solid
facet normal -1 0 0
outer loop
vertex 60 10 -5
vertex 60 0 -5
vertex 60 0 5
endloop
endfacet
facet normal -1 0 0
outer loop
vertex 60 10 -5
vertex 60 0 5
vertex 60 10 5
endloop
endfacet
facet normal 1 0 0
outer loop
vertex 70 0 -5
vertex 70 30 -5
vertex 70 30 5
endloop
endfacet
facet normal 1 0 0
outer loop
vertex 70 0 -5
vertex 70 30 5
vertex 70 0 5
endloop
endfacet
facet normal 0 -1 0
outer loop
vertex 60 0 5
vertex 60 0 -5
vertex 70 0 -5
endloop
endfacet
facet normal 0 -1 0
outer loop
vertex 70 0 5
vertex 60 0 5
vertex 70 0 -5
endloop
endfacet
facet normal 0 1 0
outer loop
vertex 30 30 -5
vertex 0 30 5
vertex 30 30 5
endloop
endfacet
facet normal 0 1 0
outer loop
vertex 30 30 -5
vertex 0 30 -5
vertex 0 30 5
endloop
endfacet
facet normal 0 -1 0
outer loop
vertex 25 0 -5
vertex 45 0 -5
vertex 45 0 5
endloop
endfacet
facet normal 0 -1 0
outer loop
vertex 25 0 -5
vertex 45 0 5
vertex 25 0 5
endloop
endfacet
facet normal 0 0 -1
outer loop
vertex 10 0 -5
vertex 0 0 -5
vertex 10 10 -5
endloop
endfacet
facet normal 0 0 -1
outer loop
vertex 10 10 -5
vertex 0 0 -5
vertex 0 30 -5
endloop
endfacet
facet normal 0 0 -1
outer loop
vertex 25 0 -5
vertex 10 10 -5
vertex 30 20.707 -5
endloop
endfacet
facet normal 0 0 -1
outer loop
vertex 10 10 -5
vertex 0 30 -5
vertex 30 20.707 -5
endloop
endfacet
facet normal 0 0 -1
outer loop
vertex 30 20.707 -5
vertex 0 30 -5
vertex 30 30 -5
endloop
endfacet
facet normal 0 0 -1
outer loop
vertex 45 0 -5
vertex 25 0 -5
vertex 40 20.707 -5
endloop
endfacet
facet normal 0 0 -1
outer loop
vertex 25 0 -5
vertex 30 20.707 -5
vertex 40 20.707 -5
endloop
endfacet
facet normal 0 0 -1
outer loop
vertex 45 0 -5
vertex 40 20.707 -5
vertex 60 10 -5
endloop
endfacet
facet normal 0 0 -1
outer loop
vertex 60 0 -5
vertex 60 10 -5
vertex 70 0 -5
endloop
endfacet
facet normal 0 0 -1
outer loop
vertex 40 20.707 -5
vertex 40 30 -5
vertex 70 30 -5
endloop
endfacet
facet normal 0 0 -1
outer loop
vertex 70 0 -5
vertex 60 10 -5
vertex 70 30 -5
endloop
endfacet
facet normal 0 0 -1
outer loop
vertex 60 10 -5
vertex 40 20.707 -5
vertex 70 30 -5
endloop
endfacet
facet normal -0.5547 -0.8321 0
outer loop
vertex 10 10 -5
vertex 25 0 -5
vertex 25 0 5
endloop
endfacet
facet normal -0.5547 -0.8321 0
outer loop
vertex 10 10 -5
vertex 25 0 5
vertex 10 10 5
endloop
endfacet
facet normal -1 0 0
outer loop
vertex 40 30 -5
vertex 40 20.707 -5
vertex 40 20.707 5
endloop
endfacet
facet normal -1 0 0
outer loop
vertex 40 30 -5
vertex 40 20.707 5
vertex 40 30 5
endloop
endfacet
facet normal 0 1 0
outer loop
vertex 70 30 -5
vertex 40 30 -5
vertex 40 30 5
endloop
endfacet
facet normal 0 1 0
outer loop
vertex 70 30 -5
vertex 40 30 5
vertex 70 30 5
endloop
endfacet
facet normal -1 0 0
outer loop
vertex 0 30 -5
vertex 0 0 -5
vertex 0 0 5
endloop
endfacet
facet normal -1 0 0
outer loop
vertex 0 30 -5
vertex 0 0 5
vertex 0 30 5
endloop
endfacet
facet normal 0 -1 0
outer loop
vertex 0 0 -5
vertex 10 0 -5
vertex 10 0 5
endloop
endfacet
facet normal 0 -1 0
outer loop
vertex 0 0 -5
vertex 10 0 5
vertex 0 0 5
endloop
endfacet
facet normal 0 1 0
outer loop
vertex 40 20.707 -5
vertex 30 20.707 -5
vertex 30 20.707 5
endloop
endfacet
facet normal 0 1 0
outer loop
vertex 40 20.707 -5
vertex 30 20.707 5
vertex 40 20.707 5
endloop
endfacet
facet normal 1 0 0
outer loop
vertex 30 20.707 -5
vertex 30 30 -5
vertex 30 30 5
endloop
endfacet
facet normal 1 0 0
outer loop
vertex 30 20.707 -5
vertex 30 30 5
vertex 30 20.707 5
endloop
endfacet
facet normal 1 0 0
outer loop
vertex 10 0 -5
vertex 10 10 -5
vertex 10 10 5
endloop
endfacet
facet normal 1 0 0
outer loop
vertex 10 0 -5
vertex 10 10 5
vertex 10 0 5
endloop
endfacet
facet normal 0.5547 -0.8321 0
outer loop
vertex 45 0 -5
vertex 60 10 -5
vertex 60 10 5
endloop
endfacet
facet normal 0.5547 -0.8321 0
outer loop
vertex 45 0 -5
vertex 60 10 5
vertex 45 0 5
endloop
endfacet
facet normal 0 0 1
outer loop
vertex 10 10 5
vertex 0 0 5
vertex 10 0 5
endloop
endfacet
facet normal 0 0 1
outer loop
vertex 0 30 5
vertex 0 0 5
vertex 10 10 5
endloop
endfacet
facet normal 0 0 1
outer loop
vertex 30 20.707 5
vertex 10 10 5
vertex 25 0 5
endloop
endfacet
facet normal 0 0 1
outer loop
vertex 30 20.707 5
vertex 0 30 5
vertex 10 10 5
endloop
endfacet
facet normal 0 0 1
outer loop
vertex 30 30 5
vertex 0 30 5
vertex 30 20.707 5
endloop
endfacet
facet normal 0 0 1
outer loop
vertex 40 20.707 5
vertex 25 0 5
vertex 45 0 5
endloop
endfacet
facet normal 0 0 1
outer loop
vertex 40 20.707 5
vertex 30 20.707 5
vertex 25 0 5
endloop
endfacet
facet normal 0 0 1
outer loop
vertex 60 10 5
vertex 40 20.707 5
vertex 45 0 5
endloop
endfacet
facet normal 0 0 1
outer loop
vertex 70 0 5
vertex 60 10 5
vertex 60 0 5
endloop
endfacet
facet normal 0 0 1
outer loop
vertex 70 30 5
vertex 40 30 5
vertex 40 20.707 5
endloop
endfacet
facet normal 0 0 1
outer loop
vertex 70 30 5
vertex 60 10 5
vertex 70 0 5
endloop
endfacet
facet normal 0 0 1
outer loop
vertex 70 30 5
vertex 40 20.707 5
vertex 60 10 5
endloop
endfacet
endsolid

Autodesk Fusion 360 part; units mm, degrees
sketch "Sketch1" plane through (0, 0, 0) normal (0, 0, 1) x (1, 0, 0)
  line L0 (0, 0) -> (0, 30)
  line L1 (0, 30) -> (30, 30)
  line L2 (30, 30) -> (30, 20.7071)
  line L3 (30, 20.7071) -> (40, 20.7071)
  line L4 (40, 20.7071) -> (40, 30)
  line L5 (40, 30) -> (70, 30)
  line L6 (70, 30) -> (70, 0)
  line L7 (60, 0) -> (60, 10)
  line L8 (60, 10) -> (45, 0)
  line L9 (45, 0) -> (25, 0)
  line L10 (25, 0) -> (10, 10)
  line L11 (10, 10) -> (10, 0)
  line L12 (10, 0) -> (0, 0)
  line L13 (60, 0) -> (70, 0)
  dimension "d1" = 30
  dimension "d4" = 30
  dimension "d5" = 30
  dimension "d9" = 70
  dimension "d10" = 10
  dimension "d11" = 15
  dimension "d12" = 20
  dimension "d13" = 10
  dimension "d14" = 15
  dimension "d15" = 10
  dimension "d16" = 30
  dimension "d17" = 10
  dimension "d18" = 10
  dimension "d19" = 20.7071
  dimension "d20" = 90
  dimension "d21" = 112.62
extrude "Extrude1" add sketch "Sketch1" along normal mid plane 10
